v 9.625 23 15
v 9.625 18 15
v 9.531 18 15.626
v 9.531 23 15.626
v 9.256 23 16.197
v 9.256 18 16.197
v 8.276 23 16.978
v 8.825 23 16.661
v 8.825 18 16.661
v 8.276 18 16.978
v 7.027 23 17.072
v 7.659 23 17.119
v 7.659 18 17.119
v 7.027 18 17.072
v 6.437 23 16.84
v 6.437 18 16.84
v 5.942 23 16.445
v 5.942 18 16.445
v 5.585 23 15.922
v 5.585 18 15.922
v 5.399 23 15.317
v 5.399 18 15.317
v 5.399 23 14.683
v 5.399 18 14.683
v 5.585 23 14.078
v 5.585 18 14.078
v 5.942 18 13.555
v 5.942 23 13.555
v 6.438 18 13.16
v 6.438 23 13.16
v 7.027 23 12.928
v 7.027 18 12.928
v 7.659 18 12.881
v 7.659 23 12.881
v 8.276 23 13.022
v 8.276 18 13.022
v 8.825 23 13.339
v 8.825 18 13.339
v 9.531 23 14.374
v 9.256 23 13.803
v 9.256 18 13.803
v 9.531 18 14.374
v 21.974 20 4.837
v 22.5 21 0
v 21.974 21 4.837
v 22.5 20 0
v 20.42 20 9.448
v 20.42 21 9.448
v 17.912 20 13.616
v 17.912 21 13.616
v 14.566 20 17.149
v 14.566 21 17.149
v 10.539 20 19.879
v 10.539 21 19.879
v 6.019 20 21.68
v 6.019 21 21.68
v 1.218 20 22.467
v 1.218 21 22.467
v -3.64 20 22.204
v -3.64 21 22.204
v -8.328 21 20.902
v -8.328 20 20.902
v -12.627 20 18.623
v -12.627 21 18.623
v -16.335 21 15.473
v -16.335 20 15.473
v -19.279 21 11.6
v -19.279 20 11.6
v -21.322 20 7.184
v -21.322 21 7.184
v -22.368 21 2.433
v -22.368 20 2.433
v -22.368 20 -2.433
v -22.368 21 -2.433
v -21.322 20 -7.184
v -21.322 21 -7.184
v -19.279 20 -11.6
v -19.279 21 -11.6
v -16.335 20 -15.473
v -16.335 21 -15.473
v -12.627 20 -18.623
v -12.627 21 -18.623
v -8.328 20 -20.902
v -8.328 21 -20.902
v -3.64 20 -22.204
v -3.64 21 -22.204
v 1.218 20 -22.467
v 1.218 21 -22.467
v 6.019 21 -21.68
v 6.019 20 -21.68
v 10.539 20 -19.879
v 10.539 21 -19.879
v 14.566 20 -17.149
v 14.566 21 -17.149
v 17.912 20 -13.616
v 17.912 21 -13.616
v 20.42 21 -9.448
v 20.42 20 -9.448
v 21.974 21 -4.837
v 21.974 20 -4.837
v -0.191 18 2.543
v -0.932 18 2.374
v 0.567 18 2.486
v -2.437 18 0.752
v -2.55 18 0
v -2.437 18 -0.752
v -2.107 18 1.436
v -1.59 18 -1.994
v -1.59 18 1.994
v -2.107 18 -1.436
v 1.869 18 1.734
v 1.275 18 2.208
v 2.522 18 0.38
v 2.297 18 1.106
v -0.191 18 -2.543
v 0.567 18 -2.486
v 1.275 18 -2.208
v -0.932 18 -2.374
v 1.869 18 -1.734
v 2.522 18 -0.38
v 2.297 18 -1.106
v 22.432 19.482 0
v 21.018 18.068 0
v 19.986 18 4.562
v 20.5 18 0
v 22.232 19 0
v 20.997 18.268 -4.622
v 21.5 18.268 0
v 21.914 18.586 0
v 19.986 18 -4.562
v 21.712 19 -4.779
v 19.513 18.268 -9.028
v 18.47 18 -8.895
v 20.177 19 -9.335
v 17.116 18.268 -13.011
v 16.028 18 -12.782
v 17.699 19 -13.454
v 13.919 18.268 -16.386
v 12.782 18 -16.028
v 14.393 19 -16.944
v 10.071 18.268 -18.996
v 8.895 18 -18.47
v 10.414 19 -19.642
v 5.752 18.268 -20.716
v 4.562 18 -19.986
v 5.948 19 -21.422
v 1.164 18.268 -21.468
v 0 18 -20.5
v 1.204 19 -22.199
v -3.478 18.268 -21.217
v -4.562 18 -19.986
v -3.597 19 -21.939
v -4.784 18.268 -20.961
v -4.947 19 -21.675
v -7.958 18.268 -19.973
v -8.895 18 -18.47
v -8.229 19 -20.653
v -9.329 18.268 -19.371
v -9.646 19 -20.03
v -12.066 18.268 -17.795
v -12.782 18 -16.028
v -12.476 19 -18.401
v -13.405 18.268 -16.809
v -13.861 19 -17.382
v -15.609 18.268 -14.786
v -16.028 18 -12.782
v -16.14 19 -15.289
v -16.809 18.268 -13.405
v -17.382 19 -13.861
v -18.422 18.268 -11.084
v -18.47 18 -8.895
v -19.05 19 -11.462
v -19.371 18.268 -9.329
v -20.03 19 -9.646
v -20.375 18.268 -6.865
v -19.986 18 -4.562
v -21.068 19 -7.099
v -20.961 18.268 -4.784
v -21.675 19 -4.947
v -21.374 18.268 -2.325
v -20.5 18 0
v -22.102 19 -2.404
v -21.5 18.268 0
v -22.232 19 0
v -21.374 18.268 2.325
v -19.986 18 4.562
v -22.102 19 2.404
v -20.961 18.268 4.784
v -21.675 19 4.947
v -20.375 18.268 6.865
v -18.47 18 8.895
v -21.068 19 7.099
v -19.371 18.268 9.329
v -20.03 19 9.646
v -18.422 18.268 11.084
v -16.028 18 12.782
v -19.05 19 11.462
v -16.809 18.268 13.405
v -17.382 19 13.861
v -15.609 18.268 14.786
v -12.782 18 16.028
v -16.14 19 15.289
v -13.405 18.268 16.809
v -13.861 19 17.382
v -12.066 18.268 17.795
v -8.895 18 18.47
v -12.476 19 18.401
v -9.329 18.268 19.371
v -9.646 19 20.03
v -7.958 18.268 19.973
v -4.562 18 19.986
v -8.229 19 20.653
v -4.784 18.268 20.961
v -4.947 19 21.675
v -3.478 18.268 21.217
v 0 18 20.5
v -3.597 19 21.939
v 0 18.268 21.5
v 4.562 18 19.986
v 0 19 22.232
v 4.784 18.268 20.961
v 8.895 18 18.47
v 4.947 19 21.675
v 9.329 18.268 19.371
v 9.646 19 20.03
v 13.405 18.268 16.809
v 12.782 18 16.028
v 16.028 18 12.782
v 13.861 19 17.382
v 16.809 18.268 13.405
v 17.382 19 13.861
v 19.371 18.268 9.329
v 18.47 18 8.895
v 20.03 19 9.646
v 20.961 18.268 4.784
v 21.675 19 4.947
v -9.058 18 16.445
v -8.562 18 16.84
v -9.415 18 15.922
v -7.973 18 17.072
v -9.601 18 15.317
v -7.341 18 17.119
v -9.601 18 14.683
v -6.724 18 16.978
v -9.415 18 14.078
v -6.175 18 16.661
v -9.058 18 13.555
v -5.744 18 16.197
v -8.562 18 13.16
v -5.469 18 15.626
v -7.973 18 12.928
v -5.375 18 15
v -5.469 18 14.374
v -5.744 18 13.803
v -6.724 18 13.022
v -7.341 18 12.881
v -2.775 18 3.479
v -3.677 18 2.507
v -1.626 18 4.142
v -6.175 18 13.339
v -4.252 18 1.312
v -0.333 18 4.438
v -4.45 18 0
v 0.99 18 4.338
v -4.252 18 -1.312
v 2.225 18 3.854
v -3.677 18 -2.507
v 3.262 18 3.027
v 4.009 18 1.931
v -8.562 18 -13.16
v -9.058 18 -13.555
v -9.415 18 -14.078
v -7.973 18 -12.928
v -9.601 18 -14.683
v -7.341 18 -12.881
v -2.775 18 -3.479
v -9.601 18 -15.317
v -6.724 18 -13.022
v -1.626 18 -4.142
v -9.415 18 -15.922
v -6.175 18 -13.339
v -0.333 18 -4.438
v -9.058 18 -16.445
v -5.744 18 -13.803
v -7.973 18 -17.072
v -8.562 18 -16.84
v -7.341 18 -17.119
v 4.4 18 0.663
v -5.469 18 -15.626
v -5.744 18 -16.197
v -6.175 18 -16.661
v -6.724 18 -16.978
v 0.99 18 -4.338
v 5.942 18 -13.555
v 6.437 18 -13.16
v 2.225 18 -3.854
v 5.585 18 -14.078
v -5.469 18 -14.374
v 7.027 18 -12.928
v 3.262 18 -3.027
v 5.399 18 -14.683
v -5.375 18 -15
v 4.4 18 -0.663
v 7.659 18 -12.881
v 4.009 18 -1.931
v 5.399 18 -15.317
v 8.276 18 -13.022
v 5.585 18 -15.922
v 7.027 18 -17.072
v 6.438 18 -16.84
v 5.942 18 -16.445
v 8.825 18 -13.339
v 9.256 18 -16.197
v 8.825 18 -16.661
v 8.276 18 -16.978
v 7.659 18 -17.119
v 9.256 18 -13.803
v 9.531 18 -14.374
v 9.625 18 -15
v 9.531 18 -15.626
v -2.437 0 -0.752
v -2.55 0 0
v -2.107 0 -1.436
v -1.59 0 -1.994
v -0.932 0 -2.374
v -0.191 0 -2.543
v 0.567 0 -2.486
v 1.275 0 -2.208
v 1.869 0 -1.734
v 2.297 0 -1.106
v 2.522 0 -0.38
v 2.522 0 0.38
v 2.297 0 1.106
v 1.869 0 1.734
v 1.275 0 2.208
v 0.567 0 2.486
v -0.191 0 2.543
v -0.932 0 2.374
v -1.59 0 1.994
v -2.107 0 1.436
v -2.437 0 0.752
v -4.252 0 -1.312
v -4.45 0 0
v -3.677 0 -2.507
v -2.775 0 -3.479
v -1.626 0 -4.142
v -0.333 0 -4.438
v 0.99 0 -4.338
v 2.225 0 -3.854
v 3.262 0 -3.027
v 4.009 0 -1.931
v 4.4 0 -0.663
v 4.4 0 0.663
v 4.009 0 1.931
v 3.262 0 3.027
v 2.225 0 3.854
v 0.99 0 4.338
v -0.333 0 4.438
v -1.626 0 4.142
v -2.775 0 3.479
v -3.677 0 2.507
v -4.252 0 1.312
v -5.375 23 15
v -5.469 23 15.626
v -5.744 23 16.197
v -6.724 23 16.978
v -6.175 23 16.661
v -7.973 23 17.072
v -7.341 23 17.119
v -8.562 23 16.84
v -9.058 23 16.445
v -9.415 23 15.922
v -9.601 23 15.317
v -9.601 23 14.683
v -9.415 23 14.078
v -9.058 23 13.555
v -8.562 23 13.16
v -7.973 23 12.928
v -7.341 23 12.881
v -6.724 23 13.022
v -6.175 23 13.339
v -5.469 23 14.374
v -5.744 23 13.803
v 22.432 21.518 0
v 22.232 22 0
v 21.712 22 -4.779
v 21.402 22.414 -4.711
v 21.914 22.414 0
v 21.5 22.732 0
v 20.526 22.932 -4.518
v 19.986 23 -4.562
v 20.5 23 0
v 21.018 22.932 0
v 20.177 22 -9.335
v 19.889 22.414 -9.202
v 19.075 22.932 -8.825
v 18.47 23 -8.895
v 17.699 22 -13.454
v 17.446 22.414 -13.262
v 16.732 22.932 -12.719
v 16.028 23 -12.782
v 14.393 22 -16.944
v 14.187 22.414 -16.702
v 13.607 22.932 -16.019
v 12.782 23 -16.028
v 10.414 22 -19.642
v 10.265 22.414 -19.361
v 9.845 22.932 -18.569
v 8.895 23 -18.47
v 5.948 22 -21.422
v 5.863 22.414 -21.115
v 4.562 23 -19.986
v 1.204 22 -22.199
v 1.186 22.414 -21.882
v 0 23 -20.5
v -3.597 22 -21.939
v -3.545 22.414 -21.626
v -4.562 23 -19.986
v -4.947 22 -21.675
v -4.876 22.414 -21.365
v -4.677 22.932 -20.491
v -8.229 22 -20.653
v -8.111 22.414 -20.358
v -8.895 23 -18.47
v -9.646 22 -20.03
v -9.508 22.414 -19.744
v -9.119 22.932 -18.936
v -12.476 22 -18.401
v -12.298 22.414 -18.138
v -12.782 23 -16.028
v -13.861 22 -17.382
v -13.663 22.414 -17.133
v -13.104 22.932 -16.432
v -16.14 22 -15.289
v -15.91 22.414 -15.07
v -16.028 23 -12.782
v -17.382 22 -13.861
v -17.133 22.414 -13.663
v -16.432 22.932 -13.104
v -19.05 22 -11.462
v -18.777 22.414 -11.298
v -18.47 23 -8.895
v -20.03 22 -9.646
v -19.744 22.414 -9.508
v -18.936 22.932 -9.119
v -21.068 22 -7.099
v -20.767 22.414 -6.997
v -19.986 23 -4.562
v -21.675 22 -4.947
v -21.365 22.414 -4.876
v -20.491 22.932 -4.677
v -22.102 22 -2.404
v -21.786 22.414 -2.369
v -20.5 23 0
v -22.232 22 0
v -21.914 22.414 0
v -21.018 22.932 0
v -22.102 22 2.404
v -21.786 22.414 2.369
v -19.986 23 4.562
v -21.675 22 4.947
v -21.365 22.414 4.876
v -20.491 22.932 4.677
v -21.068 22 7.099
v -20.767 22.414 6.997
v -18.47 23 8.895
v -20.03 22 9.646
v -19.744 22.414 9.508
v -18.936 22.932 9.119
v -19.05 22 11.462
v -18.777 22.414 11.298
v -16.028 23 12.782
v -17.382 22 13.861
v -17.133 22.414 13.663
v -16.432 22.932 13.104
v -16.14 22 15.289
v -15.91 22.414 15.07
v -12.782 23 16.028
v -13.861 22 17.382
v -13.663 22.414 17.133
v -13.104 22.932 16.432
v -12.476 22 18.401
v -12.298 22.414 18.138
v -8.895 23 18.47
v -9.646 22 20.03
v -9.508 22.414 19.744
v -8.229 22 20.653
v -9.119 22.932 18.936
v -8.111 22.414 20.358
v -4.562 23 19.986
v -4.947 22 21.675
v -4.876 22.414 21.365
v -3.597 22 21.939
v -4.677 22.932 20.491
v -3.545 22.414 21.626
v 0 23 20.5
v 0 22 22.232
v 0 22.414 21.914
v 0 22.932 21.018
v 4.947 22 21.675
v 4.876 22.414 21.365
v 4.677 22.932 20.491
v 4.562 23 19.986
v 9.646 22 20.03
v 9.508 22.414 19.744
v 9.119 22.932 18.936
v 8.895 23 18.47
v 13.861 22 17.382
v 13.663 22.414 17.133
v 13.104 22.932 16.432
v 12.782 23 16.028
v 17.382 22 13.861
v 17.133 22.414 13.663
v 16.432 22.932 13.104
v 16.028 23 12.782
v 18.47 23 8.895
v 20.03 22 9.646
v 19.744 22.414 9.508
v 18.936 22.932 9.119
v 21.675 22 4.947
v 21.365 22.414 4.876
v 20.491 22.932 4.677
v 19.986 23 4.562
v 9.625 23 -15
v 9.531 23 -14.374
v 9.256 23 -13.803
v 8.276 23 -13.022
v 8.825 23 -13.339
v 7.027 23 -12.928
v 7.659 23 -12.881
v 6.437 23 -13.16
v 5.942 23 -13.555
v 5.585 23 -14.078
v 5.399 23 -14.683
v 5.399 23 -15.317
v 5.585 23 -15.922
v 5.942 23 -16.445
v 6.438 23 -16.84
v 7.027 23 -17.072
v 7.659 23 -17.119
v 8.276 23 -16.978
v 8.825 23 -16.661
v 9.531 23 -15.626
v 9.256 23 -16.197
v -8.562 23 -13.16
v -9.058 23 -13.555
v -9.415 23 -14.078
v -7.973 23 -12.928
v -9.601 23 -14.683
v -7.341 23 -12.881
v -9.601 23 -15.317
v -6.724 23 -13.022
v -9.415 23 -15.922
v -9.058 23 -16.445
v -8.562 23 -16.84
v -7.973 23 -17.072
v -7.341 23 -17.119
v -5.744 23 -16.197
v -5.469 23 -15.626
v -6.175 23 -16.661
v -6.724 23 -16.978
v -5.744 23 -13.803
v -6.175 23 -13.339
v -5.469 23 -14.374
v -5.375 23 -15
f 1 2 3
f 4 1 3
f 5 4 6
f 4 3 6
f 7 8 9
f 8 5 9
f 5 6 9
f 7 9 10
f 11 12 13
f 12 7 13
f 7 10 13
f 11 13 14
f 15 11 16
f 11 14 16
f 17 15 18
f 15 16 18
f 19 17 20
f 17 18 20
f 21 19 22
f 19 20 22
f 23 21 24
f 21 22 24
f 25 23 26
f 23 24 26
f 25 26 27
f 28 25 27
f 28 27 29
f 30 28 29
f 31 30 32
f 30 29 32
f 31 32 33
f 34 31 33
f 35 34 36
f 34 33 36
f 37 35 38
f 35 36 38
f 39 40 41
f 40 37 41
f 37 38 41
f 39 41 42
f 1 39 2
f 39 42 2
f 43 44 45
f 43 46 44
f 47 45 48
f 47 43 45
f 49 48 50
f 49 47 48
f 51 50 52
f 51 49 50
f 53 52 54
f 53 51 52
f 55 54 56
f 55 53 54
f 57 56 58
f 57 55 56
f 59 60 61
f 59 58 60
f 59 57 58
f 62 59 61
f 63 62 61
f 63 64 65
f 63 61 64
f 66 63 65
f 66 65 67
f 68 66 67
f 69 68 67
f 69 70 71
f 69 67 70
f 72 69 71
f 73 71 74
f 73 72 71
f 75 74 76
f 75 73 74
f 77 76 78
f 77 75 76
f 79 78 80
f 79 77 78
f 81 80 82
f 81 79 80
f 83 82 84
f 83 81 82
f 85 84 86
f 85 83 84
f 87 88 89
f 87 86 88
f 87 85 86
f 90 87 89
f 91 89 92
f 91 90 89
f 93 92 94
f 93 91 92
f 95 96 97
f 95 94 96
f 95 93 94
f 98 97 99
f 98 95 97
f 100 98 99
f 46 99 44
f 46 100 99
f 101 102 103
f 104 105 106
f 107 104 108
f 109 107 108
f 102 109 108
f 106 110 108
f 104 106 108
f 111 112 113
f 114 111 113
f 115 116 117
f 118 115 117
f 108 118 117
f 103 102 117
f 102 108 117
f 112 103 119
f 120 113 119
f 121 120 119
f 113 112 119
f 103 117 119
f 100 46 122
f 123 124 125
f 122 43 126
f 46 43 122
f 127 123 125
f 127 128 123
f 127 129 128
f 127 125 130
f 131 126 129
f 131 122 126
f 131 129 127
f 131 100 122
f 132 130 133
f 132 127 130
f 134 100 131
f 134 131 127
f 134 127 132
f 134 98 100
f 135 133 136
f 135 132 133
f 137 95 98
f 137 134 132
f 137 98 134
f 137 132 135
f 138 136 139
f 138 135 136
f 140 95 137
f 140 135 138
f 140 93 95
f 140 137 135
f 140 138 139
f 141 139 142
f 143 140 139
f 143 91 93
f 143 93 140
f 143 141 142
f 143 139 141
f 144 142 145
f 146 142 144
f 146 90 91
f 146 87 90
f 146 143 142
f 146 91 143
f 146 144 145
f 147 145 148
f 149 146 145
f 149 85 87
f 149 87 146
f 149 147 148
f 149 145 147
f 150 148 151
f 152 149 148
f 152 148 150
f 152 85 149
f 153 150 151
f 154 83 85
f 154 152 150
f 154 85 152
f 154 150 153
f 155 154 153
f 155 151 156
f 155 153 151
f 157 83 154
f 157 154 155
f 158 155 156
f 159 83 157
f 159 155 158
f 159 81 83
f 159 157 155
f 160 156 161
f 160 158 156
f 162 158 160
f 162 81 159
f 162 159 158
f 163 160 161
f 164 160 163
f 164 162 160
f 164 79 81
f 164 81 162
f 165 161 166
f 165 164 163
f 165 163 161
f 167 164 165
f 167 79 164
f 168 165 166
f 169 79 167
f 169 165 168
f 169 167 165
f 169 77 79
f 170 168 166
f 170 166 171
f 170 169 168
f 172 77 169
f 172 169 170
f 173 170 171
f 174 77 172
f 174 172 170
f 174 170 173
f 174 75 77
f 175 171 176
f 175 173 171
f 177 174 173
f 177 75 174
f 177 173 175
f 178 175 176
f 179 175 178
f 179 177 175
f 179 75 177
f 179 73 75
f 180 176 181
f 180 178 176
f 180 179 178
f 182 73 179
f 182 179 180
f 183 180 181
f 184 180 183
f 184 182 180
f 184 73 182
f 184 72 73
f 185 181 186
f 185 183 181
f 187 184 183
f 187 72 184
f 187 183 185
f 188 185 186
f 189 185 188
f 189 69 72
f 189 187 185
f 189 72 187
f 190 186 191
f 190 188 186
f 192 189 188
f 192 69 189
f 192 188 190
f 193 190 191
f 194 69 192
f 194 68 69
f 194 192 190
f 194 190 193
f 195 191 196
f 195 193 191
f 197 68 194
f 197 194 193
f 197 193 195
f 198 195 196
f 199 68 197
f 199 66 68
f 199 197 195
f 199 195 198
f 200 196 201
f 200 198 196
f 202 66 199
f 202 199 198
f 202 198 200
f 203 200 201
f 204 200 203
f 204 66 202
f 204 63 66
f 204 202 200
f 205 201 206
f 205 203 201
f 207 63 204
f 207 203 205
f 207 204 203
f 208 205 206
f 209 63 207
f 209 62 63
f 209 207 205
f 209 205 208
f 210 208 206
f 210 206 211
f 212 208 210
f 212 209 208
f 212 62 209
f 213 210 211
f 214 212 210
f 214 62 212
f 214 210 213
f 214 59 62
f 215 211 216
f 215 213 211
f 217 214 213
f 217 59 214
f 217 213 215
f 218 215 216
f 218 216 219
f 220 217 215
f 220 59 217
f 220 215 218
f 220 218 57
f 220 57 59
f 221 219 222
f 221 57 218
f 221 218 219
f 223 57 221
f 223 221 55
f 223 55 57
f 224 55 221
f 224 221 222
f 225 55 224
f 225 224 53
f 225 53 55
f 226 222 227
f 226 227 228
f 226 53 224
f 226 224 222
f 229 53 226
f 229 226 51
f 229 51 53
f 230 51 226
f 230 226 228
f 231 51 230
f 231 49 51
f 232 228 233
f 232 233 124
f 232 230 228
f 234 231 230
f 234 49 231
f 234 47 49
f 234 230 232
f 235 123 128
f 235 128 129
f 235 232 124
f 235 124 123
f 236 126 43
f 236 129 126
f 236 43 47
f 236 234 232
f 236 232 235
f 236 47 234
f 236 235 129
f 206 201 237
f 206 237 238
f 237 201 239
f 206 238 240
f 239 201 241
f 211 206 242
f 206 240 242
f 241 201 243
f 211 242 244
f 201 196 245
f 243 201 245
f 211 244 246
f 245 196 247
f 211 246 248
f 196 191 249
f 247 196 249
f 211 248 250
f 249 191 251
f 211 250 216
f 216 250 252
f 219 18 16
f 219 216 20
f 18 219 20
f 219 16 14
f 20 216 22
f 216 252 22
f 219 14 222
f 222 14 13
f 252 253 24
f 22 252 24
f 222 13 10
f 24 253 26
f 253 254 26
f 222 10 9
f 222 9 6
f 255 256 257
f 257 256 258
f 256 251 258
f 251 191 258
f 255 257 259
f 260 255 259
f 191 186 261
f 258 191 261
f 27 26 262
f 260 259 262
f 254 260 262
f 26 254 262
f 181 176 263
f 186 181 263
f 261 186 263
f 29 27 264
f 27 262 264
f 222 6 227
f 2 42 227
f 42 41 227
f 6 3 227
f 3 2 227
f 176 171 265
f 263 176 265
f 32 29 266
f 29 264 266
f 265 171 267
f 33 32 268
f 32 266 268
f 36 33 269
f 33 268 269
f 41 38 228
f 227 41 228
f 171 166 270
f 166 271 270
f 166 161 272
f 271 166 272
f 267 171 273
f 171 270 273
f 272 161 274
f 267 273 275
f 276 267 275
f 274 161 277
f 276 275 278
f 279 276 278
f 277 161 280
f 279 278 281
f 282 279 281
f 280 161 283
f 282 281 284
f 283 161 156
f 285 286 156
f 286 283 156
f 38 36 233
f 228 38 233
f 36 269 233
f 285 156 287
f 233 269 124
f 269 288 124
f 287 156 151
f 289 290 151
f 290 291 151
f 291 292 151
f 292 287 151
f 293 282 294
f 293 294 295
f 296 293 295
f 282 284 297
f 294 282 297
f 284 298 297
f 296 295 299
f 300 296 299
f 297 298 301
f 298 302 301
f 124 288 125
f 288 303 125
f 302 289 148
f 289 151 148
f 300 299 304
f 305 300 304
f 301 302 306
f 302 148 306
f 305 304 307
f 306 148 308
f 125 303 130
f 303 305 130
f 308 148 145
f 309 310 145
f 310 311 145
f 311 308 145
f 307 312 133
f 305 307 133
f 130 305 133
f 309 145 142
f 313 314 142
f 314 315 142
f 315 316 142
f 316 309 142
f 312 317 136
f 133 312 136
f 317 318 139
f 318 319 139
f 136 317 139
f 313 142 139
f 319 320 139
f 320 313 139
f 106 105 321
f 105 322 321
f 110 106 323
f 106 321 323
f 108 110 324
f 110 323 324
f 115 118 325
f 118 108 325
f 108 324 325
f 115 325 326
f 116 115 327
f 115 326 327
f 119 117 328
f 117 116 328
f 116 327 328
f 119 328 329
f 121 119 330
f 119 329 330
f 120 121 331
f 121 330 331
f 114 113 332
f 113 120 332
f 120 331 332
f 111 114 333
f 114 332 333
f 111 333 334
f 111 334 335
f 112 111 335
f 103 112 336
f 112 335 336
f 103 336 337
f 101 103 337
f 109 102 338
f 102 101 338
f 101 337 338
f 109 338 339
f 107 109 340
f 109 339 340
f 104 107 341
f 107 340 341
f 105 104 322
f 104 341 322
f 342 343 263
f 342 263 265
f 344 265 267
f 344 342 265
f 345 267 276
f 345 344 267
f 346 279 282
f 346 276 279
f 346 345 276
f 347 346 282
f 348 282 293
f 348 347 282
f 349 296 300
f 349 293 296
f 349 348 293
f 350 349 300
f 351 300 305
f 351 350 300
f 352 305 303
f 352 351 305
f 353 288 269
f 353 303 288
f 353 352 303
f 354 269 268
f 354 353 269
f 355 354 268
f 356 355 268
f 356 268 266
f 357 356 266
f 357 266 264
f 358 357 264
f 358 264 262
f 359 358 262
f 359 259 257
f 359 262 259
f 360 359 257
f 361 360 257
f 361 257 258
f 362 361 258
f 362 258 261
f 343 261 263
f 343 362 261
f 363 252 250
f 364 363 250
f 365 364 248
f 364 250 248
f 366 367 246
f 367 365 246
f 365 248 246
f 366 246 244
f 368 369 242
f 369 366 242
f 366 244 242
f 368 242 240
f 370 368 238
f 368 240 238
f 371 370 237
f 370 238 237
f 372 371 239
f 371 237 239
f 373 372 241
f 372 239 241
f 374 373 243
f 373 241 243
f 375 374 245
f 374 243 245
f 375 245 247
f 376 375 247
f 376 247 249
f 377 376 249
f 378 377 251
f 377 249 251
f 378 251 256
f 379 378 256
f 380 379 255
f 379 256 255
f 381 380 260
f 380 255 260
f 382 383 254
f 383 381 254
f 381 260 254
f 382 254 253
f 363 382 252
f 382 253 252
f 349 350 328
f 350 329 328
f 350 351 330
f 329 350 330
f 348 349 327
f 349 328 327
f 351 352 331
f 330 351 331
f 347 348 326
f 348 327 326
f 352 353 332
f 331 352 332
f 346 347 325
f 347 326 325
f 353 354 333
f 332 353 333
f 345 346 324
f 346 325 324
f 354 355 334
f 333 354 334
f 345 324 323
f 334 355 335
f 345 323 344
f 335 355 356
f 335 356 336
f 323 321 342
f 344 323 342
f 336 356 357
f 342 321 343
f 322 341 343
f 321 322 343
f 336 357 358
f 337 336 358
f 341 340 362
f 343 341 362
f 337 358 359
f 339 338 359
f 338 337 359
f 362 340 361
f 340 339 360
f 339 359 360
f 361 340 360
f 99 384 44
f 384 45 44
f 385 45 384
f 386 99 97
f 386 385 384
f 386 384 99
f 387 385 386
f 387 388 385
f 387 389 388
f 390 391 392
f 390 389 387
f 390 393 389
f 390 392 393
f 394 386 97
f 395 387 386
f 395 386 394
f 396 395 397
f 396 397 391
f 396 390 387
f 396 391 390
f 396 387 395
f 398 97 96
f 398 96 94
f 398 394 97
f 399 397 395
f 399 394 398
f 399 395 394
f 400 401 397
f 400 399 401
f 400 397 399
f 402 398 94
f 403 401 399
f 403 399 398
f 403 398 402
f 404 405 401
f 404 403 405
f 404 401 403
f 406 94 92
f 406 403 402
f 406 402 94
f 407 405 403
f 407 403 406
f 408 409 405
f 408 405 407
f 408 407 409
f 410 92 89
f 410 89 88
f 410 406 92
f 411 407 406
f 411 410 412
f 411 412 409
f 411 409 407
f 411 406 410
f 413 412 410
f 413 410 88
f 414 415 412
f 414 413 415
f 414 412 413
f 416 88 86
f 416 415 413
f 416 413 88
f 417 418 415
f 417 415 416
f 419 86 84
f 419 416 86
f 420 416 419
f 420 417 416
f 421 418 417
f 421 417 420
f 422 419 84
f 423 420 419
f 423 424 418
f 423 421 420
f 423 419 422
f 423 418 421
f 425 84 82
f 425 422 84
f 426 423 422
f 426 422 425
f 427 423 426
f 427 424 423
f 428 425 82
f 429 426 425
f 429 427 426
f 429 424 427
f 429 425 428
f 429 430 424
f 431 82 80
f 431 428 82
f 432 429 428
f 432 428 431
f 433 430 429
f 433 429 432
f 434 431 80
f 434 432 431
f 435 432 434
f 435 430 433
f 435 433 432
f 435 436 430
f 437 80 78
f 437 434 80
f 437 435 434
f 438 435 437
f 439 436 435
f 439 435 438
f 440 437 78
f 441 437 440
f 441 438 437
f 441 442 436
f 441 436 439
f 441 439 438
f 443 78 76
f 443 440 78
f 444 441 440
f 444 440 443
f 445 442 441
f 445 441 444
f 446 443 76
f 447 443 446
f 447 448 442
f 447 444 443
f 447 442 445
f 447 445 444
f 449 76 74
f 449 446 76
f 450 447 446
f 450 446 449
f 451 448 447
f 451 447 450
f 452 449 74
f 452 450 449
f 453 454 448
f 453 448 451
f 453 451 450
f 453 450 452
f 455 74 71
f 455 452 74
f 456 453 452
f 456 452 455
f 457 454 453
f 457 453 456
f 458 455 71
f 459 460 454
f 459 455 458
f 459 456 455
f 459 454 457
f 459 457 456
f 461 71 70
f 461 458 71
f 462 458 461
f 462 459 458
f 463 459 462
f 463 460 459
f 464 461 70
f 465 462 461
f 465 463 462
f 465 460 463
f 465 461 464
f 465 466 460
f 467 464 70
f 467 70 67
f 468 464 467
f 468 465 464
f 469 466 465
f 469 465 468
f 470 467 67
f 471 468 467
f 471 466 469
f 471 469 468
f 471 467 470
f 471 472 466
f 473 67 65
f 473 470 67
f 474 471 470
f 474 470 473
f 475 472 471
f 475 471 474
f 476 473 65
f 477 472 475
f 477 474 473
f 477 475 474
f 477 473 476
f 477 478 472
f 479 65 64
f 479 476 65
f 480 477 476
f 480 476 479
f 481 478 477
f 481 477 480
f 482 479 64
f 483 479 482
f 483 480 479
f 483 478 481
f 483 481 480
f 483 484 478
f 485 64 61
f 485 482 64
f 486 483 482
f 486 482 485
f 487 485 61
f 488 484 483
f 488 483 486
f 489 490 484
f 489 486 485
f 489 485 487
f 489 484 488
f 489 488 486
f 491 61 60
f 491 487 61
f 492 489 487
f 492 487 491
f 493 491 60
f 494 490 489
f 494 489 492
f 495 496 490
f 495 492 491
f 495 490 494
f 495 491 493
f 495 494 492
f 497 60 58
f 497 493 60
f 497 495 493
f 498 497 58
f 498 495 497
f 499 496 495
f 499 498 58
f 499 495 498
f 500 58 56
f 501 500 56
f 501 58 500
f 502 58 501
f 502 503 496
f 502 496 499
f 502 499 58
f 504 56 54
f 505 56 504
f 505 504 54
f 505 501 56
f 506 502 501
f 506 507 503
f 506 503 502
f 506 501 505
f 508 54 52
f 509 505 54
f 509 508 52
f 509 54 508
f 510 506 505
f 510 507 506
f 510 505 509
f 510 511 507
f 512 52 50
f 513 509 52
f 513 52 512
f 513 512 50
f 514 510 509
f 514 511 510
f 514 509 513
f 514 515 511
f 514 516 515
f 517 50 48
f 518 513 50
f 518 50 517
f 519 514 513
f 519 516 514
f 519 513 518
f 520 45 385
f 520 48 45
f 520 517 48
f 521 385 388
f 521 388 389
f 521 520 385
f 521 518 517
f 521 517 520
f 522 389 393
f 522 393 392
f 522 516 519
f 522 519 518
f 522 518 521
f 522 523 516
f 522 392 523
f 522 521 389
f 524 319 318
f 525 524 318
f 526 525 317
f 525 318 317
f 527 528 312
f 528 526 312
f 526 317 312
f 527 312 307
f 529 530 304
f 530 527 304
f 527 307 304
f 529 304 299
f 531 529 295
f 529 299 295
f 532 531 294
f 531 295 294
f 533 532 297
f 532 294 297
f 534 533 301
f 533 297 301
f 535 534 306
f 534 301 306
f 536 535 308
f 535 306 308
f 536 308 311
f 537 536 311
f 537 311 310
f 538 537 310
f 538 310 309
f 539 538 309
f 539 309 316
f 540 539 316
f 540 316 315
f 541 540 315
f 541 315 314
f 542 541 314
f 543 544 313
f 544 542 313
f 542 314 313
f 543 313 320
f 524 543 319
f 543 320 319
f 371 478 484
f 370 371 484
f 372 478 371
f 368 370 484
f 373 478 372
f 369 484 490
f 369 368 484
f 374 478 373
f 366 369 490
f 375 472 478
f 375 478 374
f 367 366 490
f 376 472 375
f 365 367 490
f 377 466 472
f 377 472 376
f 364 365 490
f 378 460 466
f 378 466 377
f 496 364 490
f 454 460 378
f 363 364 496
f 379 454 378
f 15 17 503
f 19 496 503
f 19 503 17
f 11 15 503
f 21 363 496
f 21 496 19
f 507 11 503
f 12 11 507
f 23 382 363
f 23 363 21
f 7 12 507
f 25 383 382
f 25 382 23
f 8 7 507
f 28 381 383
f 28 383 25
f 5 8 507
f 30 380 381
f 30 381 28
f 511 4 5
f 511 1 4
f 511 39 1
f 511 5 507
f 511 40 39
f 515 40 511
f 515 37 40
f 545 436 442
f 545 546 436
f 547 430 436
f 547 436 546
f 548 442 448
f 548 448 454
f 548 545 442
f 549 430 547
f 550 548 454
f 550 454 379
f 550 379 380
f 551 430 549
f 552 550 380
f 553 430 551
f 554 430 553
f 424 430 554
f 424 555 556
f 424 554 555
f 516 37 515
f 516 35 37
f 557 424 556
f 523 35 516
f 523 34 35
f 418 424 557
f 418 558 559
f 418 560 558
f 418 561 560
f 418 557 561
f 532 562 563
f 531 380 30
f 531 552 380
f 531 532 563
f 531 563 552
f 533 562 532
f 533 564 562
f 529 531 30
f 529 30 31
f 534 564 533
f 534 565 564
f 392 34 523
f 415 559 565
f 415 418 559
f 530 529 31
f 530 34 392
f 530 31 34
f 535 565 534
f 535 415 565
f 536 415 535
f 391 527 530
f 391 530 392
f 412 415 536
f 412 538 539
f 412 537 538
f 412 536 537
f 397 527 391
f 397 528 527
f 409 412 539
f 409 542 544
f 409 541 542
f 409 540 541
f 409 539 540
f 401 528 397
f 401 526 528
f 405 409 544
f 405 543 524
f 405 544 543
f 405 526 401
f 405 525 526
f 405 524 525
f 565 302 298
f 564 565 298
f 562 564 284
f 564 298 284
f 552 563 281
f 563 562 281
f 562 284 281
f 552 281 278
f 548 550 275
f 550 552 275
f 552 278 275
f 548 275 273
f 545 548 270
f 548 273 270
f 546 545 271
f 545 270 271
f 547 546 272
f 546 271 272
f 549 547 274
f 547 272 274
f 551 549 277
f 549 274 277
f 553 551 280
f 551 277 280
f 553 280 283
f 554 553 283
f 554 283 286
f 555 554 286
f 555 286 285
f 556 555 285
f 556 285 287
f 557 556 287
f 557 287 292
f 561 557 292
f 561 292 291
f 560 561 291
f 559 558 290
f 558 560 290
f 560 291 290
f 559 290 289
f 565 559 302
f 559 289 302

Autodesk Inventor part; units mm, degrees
ref_plane "YZ Plane" through (0, 0, 0) normal (1, 0, 0) x (0, 1, 0)
ref_plane "XZ Plane" through (0, 0, 0) normal (0, 1, 0) x (-1, 0, 0)
ref_plane "XY Plane" through (0, 0, 0) normal (0, 0, 1) x (1, 0, 0)
sketch "Sketch1" plane through (0, 0, 0) normal (0, 1, 0) x (-1, 0, 0)
  circle A0 centre (0, 0) radius 4.45
  circle A1 centre (0, 0) radius 2.55
  dimension "d0" = 8.9
  dimension "d1" = 5.1
extrude "Extrusion1" add sketch "Sketch1" along normal blind 18
sketch "Sketch2" plane through (0, 18, 0) normal (0, 1, 0) x (1, 0, 0)
  line L0 (25, -25) -> (-25, -25)
  line L1 (-25, -25) -> (-25, 25)
  line L2 (-25, 25) -> (25, 25)
  line L3 (25, 25) -> (25, -25)
  line L4 (25, -25) -> (-25, 25) construction
  line L5 (-25, -25) -> (25, 25) construction
  line L6 (7.5, -12.875) -> (-7.5, -12.875)
  line L7 (-7.5, -12.875) -> (-7.5, 12.875)
  line L8 (-7.5, 12.875) -> (7.5, 12.875)
  line L9 (7.5, 12.875) -> (7.5, -12.875)
  line L10 (7.5, -12.875) -> (-7.5, 12.875) construction
  line L11 (-7.5, -12.875) -> (7.5, 12.875) construction
  line L12 (-7.5, 12.875) -> (-7.5, 17.125)
  circle A0 centre (-7.5, 15) radius 2.125
  circle A1 centre (7.5, 15) radius 2.125
  line L13 (-7.5, -12.875) -> (-7.5, -17.125)
  circle A2 centre (-7.5, -15) radius 2.125
  circle A3 centre (7.5, -15) radius 2.125
  circle A4 centre (0, 0) radius 4.45 projected
  circle A5 centre (0, 0) radius 22.5
  dimension "d7" = 50
  dimension "d8" = 50
  dimension "d9" = 15
  dimension "d10" = 25.75
  dimension "d11" = 4.25
  dimension "d12" = 4.25
  dimension "d13" = 45
extrude "Extrusion2" add sketch "Sketch2" along normal blind 5 contours L6 L7 L8 L9 | A4 | A5
fillet "Fillet1" radius 2 2 edges at (-22.5, 18, 0) (-22.5, 23, 0)
properties part number "mountingnema" material "Aluminum 6061"
